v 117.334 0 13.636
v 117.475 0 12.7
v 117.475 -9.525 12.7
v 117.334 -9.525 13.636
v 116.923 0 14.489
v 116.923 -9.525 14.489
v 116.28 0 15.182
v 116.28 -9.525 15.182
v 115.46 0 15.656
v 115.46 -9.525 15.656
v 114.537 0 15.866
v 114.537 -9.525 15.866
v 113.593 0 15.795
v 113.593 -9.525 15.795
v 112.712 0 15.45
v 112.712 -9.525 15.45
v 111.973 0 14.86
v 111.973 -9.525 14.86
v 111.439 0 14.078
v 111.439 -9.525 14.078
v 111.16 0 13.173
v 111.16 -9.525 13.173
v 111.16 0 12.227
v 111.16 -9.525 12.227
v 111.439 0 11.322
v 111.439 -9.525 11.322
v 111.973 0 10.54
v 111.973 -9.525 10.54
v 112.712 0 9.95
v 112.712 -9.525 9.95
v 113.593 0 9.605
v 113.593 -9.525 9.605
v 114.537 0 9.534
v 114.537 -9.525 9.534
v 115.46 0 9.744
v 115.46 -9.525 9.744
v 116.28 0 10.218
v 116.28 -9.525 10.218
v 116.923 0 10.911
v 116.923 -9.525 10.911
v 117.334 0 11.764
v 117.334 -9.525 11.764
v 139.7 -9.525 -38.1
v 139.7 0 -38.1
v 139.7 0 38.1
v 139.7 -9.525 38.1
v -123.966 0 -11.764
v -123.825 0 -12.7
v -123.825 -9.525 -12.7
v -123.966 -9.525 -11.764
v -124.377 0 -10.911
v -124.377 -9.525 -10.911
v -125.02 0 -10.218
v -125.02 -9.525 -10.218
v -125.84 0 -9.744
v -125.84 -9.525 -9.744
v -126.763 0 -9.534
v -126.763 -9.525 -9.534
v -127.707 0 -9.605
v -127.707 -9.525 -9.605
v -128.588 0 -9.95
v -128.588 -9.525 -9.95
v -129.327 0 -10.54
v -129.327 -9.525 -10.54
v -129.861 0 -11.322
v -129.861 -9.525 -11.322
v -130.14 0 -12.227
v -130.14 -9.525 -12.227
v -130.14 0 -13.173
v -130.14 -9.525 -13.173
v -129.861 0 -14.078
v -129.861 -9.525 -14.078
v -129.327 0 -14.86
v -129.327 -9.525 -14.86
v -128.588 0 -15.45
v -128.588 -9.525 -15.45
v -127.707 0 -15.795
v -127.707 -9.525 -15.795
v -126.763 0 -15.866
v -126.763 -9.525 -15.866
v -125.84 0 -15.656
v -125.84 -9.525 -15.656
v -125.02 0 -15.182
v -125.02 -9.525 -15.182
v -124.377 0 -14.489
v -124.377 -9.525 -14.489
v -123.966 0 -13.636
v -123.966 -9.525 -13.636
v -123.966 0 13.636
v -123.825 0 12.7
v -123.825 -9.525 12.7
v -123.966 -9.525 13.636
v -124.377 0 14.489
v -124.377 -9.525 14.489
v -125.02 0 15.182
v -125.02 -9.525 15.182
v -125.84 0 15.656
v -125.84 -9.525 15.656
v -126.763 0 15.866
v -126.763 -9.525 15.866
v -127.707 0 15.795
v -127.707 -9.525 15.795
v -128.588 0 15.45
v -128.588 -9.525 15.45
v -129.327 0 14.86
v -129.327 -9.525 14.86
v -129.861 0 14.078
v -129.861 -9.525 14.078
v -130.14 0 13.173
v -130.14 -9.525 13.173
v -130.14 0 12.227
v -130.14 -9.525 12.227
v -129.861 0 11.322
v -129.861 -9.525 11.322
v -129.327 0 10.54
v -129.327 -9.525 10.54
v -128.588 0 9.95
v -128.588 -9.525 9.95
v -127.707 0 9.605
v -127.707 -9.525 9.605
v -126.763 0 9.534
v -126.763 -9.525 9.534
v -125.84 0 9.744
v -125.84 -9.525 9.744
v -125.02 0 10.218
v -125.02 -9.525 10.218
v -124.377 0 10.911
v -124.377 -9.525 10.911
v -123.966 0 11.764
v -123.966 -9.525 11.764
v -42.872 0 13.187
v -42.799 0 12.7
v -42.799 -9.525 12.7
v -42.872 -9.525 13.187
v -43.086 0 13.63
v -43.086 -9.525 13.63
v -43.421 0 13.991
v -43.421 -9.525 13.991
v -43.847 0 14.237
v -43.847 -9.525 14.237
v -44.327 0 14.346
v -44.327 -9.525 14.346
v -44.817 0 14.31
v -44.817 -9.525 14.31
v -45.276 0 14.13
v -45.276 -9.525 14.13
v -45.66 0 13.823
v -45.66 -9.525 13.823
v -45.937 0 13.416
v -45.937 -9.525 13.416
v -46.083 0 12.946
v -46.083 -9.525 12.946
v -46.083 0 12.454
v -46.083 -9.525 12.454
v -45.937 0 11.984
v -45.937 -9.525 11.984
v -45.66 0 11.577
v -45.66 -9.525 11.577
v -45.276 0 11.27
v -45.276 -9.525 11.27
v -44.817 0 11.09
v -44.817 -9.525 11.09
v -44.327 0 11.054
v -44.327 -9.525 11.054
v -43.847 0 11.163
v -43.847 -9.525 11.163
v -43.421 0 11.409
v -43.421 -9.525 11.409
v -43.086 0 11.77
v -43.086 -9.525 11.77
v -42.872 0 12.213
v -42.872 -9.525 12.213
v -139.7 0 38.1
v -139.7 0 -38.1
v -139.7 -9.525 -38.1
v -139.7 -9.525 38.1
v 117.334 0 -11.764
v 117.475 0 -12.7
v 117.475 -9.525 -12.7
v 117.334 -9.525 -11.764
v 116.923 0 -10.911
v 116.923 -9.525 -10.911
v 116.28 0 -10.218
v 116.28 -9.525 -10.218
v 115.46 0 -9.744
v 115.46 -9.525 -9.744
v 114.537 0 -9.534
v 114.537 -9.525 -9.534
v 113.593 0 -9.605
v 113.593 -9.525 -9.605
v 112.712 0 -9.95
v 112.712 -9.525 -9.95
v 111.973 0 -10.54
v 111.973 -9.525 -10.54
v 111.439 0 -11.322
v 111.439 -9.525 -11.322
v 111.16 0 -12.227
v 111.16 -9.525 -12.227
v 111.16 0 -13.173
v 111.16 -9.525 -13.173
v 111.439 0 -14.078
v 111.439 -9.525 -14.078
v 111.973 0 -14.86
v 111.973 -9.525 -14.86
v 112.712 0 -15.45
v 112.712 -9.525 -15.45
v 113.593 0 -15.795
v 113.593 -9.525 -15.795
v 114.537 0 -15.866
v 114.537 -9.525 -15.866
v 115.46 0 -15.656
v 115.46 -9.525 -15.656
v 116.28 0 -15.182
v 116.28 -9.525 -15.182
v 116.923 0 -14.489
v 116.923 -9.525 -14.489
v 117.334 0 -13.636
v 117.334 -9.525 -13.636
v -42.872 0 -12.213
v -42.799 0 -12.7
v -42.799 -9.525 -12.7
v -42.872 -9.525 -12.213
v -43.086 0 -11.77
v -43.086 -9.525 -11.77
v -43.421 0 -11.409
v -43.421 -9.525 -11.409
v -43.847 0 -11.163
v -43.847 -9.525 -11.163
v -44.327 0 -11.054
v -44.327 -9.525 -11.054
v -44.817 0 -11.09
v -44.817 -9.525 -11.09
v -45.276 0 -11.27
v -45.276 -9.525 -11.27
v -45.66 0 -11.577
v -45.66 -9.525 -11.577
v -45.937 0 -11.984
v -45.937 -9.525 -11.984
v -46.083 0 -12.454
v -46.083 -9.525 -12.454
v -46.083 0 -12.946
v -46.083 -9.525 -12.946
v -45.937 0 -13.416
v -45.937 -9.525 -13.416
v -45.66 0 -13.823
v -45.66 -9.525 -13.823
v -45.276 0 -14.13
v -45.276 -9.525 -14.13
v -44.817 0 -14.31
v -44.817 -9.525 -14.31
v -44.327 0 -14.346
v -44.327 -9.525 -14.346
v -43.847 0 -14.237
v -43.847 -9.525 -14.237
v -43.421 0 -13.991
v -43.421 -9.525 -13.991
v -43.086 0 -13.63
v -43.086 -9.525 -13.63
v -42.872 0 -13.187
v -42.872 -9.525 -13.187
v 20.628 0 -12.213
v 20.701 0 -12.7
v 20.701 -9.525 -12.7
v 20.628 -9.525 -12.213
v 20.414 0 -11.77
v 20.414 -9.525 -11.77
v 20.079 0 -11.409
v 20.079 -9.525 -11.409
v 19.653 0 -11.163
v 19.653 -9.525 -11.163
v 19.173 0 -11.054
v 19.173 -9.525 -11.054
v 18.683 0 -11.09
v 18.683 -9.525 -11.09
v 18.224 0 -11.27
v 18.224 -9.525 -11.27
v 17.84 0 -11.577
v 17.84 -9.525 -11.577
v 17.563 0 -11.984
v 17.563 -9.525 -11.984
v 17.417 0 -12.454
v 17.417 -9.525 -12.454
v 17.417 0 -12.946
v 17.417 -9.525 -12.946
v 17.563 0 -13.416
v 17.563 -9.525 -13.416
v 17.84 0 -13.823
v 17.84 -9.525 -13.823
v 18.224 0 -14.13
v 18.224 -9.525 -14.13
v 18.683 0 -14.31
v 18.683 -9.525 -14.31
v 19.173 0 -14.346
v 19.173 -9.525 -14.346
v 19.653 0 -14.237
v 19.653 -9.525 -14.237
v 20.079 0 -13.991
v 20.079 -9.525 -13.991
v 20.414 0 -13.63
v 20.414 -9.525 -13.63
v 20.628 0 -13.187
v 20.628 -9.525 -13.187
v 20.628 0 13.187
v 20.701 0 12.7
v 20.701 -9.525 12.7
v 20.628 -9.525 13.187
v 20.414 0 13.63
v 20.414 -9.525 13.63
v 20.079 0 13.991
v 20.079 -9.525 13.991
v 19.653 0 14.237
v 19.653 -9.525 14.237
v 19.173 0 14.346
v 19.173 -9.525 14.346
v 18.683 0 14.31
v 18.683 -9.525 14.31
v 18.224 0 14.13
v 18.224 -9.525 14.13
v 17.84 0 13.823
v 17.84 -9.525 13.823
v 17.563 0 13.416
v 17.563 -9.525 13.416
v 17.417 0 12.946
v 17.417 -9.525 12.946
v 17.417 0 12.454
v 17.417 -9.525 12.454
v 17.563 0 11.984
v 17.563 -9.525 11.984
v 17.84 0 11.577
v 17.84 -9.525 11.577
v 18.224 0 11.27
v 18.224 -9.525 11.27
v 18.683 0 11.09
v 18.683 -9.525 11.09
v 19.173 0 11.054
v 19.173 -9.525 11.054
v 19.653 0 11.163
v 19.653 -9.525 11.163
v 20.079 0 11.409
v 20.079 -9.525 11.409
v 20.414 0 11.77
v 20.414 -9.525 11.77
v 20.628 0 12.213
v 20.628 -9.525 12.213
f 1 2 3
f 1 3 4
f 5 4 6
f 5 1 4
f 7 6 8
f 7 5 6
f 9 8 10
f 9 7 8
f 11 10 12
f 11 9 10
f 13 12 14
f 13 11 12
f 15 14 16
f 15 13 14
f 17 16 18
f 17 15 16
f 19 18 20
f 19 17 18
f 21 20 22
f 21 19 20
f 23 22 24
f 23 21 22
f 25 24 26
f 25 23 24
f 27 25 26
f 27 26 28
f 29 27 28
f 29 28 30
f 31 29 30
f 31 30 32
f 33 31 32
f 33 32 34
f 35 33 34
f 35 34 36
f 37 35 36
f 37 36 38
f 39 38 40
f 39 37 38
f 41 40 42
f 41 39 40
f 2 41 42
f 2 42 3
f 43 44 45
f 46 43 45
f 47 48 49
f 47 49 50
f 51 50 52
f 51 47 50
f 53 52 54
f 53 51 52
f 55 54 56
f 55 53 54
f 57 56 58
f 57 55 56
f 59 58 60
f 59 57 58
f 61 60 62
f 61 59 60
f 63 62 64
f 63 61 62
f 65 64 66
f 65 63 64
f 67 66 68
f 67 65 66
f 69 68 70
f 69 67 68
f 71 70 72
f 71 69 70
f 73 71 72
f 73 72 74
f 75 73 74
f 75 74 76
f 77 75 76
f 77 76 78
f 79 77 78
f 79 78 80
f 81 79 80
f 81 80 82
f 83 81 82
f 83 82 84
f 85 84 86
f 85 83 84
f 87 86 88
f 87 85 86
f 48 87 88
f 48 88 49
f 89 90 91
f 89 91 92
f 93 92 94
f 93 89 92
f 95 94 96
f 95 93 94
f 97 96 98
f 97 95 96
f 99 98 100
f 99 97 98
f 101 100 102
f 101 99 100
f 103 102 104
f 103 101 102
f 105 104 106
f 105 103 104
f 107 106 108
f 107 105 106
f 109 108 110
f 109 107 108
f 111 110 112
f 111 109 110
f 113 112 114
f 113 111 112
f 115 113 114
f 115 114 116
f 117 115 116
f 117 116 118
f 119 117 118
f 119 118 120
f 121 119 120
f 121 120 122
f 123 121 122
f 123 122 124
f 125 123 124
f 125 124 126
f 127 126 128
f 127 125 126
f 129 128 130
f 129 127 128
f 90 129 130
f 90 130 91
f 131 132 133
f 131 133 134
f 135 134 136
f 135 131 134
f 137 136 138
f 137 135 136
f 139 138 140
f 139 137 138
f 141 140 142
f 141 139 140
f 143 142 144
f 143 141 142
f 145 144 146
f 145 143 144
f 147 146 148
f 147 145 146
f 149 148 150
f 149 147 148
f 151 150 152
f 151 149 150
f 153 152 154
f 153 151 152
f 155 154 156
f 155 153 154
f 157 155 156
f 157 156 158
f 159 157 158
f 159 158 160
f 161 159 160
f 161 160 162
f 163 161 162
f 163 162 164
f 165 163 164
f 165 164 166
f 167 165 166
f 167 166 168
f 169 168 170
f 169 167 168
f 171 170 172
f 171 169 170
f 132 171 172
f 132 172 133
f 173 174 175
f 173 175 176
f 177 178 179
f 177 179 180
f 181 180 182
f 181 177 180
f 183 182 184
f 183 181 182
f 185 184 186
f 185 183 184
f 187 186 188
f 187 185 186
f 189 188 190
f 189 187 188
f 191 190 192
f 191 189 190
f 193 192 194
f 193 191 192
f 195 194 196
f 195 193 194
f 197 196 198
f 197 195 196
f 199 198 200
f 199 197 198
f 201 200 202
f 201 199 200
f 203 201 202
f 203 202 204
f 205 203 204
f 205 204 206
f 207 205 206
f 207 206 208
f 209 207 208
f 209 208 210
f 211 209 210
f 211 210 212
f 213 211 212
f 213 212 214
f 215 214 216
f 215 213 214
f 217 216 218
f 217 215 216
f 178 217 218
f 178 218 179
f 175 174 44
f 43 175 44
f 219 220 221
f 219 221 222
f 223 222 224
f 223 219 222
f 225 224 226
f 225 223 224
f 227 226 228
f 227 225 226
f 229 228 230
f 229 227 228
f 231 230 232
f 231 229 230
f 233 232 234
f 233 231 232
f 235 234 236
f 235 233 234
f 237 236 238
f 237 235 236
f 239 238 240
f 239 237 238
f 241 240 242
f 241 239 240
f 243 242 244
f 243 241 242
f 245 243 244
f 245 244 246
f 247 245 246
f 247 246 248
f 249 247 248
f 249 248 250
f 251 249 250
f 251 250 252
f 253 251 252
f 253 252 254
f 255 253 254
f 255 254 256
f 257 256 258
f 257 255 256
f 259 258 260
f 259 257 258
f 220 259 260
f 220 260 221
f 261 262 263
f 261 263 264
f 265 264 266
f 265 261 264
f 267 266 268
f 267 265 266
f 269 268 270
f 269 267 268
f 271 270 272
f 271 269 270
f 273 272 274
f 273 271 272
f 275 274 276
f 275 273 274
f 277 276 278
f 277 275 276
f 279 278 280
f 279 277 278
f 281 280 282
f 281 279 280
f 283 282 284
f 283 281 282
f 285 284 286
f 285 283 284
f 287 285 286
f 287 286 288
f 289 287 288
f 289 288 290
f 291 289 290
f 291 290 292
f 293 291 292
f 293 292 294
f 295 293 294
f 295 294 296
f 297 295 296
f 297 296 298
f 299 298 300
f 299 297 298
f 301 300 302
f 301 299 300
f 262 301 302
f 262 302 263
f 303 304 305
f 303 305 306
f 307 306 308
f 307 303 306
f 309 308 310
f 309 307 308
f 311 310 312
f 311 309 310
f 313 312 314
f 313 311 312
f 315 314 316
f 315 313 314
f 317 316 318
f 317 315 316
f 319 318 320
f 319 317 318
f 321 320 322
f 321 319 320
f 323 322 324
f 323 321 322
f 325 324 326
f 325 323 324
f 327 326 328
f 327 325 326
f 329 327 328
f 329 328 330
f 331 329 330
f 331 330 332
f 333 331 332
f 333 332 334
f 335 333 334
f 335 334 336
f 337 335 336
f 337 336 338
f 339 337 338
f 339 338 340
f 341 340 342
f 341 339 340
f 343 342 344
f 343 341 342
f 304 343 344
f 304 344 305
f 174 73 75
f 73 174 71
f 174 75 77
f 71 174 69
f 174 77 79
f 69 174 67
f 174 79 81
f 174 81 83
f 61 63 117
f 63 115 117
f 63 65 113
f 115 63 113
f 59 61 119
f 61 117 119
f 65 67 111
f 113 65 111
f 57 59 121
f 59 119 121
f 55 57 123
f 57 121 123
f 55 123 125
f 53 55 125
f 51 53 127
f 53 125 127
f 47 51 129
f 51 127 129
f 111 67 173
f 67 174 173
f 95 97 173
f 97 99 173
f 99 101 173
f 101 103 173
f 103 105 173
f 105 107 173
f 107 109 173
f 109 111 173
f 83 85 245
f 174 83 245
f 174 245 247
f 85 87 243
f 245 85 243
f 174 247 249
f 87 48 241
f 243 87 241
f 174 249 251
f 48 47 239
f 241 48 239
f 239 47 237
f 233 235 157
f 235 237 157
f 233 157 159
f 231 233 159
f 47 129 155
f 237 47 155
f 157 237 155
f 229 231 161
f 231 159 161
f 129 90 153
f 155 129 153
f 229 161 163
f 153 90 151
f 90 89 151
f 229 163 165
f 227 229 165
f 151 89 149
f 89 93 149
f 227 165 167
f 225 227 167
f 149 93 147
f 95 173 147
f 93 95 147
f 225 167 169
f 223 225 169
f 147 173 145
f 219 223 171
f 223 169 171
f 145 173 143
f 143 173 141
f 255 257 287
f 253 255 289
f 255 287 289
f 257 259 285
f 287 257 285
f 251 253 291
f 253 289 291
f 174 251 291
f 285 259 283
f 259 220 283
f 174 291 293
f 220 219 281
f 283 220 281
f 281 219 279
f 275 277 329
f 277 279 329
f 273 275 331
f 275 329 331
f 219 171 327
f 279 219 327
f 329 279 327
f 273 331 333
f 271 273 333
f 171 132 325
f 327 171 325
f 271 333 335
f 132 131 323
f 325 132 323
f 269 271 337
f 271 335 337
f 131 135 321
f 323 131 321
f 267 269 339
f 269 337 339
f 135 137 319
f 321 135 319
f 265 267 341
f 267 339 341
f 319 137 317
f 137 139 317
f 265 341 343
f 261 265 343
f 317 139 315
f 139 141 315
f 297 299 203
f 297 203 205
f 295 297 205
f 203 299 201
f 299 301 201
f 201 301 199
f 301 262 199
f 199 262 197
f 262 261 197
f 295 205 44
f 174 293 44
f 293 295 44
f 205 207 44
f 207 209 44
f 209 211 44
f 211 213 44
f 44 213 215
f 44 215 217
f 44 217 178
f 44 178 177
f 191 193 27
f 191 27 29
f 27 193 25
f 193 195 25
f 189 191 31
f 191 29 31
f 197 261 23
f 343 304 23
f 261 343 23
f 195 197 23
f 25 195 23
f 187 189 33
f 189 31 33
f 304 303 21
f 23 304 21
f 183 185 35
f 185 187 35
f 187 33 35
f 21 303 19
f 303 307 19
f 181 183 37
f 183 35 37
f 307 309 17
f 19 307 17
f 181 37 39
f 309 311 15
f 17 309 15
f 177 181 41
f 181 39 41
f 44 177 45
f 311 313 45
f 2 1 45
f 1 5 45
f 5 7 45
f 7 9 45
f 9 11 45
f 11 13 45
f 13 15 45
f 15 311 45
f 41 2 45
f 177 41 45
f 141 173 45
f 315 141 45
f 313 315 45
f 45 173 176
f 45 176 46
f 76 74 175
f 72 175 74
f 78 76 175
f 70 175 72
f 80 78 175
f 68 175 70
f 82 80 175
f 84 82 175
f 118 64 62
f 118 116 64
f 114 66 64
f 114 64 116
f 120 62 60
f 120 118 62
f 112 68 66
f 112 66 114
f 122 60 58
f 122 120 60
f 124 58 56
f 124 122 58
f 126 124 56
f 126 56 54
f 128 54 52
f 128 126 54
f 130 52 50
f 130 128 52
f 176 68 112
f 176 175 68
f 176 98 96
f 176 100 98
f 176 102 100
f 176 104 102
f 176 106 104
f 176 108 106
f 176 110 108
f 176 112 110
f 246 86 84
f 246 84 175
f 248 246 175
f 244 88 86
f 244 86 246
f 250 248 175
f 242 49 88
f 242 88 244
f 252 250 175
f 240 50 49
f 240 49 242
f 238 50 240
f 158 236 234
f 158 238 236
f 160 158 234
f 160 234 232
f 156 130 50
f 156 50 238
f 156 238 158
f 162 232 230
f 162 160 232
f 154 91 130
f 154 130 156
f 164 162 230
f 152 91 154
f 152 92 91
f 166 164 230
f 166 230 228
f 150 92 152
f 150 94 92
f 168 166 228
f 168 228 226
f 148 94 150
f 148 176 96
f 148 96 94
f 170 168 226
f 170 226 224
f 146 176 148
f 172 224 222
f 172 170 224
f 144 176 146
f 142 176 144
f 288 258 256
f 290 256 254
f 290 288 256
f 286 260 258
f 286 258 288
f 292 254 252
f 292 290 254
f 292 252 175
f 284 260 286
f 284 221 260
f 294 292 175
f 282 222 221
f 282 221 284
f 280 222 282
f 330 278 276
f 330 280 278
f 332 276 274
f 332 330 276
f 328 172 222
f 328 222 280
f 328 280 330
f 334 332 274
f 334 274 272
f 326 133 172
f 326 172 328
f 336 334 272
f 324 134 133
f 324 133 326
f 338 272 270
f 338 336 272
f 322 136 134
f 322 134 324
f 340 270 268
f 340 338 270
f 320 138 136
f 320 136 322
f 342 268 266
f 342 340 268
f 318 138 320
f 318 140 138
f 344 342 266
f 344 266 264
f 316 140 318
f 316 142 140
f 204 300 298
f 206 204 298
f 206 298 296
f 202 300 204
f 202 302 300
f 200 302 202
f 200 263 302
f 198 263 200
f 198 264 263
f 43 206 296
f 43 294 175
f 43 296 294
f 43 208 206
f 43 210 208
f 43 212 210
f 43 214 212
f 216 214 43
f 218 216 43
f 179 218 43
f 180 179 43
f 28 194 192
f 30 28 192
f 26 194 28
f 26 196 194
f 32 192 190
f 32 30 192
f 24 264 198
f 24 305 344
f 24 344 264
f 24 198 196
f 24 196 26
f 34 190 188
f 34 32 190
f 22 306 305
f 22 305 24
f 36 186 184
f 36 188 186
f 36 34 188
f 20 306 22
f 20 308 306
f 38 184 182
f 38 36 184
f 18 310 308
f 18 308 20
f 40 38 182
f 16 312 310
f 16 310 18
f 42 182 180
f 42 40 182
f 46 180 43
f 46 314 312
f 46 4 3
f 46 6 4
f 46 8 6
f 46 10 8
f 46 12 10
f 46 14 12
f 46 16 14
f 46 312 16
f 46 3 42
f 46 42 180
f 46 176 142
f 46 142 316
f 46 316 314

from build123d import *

# Parameters (mm, degrees)
F0_W     = 279.4
F0_H     = 76.2
F0_R     = 3.175
F0_R_2   = 1.651
F1_DEPTH = 9.525


with BuildPart() as f1:
    # F0 (on Front) → F1 (new body)
    with BuildSketch(Plane.XZ):
        Rectangle(F0_W, F0_H)
        with Locations((-127, -12.7)):
            Circle(F0_R, mode=Mode.SUBTRACT)
        with Locations((-44.45, -12.7)):
            Circle(F0_R_2, mode=Mode.SUBTRACT)
        with Locations((19.05, -12.7)):
            Circle(F0_R_2, mode=Mode.SUBTRACT)
        with Locations((114.3, -12.7)):
            Circle(F0_R, mode=Mode.SUBTRACT)
        with Locations((-127, 12.7)):
            Circle(F0_R, mode=Mode.SUBTRACT)
        with Locations((-44.45, 12.7)):
            Circle(F0_R_2, mode=Mode.SUBTRACT)
        with Locations((19.05, 12.7)):
            Circle(F0_R_2, mode=Mode.SUBTRACT)
        with Locations((114.3, 12.7)):
            Circle(F0_R, mode=Mode.SUBTRACT)
    extrude(amount=F1_DEPTH)


solid = f1.part
